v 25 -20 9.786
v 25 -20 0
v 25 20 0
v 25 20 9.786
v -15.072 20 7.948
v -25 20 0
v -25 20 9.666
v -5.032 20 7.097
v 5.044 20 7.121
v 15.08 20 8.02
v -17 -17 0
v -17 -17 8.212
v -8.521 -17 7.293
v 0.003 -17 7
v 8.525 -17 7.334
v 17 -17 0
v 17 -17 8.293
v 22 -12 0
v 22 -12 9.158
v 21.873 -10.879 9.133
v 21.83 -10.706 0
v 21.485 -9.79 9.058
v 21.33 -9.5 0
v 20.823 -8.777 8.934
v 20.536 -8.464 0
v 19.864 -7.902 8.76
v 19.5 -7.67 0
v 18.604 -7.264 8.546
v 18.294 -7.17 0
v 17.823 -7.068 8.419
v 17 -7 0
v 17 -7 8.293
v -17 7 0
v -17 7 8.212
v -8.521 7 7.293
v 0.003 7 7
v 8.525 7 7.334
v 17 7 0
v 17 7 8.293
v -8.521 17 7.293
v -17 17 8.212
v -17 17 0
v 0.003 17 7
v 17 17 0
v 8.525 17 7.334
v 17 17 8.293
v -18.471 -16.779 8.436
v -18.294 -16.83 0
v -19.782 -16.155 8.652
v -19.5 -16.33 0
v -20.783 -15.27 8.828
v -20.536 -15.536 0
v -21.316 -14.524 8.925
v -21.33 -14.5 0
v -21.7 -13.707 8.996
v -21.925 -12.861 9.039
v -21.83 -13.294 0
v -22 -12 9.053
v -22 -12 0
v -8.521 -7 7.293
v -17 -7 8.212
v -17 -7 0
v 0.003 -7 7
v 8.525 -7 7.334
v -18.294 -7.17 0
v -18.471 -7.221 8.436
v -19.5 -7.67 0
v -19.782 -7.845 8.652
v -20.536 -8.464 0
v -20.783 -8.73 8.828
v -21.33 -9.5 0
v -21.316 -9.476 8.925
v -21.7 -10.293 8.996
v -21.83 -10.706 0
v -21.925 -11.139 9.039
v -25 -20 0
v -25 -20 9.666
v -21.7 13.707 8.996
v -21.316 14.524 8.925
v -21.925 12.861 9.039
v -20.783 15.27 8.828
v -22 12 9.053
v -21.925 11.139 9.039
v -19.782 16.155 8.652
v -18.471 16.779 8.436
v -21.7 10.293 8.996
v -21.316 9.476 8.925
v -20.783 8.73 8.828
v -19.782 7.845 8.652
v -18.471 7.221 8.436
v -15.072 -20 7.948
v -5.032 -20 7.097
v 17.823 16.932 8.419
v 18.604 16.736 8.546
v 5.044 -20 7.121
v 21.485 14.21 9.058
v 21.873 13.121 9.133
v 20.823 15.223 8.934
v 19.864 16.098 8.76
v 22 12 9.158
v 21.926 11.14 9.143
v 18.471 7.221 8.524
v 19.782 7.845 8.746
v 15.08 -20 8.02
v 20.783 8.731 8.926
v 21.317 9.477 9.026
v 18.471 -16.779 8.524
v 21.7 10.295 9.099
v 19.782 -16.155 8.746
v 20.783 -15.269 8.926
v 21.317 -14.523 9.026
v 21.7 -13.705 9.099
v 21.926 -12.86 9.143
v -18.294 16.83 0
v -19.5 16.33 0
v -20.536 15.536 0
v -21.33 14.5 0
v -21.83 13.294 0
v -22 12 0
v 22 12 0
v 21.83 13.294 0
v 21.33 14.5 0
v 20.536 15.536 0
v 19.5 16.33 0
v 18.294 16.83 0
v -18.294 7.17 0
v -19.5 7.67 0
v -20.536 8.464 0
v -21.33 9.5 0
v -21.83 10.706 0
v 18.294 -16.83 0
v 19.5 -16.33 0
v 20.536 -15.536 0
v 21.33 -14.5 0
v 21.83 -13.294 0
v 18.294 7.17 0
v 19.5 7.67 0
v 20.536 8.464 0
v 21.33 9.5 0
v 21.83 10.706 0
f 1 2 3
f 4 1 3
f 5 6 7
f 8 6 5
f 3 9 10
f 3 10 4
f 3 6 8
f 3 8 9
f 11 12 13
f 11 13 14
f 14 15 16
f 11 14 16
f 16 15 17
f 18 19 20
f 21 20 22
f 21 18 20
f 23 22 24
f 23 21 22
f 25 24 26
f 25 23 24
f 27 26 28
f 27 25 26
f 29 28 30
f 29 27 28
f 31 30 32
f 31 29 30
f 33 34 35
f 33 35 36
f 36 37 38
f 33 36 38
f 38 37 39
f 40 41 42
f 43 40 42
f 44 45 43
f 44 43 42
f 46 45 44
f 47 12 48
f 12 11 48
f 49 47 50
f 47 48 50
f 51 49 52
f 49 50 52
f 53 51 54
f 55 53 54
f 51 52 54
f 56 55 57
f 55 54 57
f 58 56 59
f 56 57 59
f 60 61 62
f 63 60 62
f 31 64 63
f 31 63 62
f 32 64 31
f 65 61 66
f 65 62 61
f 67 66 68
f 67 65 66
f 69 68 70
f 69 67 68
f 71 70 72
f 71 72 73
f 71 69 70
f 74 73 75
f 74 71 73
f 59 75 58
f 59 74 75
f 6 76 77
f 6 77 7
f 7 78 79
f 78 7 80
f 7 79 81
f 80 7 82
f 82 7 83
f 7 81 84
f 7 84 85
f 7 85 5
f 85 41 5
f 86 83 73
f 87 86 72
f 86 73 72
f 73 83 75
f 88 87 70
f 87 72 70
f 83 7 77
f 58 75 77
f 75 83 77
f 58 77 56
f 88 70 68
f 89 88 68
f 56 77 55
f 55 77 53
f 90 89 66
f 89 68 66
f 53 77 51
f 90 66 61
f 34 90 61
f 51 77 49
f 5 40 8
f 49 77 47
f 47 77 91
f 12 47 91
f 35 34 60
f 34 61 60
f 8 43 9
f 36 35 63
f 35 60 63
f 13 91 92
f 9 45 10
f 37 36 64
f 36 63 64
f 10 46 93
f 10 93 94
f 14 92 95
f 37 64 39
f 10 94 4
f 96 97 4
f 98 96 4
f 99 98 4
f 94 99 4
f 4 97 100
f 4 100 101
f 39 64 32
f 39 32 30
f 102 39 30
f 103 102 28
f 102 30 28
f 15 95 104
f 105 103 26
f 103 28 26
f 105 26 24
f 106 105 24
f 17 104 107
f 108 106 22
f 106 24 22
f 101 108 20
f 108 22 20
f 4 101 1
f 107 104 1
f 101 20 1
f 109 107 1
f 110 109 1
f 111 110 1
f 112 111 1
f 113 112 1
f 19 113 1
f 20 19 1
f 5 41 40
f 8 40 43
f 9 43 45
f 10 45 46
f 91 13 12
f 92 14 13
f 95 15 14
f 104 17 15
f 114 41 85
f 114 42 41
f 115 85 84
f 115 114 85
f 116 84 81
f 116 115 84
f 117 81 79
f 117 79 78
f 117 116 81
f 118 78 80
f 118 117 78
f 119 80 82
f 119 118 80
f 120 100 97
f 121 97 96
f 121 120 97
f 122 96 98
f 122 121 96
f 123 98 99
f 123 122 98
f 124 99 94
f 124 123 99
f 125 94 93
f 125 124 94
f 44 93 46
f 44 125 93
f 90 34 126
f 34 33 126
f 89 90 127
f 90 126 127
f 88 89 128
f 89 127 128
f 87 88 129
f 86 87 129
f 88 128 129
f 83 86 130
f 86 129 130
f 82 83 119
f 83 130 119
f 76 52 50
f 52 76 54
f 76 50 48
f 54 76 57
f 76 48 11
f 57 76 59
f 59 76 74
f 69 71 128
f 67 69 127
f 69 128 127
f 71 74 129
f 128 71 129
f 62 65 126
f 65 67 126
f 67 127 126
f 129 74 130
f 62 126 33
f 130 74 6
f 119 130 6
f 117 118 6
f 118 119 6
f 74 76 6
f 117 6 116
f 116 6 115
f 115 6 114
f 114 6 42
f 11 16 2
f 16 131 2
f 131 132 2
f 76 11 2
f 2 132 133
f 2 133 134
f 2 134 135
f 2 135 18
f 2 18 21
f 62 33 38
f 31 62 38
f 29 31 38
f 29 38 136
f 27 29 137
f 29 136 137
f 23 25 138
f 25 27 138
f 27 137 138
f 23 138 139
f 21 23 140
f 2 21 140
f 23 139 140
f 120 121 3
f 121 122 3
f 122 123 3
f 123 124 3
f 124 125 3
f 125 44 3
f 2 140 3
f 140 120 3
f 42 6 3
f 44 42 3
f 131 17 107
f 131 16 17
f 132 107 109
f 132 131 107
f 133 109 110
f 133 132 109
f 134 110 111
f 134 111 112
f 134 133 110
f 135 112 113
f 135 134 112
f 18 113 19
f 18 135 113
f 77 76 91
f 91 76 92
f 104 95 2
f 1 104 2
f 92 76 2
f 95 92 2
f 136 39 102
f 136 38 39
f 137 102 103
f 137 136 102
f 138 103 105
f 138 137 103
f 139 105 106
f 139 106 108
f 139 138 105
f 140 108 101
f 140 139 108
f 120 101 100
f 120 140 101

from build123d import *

# Parameters (mm, degrees)
F0_W     = 50
F0_H     = 40
F1_DEPTH = 10
F3_DEPTH = 40
F5_W     = 44
F5_H     = 10
F6_DEPTH = 18
F7_R     = 4.99999


# Not quite as in the source:
# - a fillet or chamfer is up to 0.001 mm smaller than in the source, because OpenCascade refuses the exact size


with BuildPart() as f1:
    # F0 (on Top) → F1 (new body)
    with BuildSketch(Plane.XY):
        Rectangle(F0_W, F0_H)
    extrude(amount=F1_DEPTH)

    # F2 (on face) → F3 (cut)
    with BuildSketch(Plane.XZ.offset(20)):
        with BuildLine():
            Line((-25, 10), (-25, 9.6663655309))
            ThreePointArc((-25, 9.6663655309), (0.0065046461, 7.0000153387), (25, 9.7856728837))
            Line((25, 9.7856728837), (25, 10))
            Line((25, 10), (-25, 10))
        make_face()
    extrude(amount=-F3_DEPTH, mode=Mode.SUBTRACT)

    # F5 (on offset) → F6 (cut)
    with BuildSketch(Plane.XY.offset(10)):
        with Locations((0, 12)):
            Rectangle(F5_W, F5_H)
        with Locations((0, -12)):
            Rectangle(F5_W, F5_H)
    extrude(amount=-F6_DEPTH, mode=Mode.SUBTRACT)

    # F7 (radius 5 in the source; OpenCascade refuses exactly that, so slightly less here)
    f7_edges = [f1.edges().sort_by_distance(p)[0] for p in [
        (-22, 17, 4.52656),
        (22, 17, 4.578769),
        (-22, -7, 4.52656),
        (22, -7, 4.578769),
        (-22, -17, 4.52656),
        (22, -17, 4.578769),
        (22, 7, 4.578769),
        (-22, 7, 4.52656),
    ]]
    fillet(f7_edges, radius=F7_R)


solid = f1.part
